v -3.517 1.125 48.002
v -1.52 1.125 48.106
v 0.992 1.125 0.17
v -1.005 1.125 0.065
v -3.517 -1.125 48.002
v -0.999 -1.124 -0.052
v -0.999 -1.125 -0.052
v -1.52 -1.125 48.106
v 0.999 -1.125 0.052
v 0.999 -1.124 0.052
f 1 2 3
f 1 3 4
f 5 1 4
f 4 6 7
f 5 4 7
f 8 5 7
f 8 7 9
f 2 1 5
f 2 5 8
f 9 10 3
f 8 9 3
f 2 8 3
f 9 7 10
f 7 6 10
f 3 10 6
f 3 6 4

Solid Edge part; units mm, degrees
sketch "Sketch1" plane through (0, 0, 0) normal (-0.0523, 0, 0.9986) x (0, 1, 0)
  line L0 (1.125, -1) -> (1.125, 1)
  line L1 (1.125, 1) -> (-1.125, 1)
  line L2 (-1.125, 1) -> (-1.125, -1)
  line L3 (-1.125, -1) -> (1.125, -1)
extrude "ExtrudedProtrusion_1" add sketch "Sketch1" along normal blind 48.12
sketch "Sketch2" plane through (-0.2574, 0, 24.0194) normal (0.9986, 0, 0.0523) x (0.0523, 0, -0.9986)
  line L0 (24, -1.125) -> (24, 1.125)
  line L1 (23.8821, 1.125) -> (24, 1.125)
  line L2 (24, -1.125) -> (23.8821, 1.125)
extrude "Cutout1" cut sketch "Sketch2" against normal up to vertex (2 mm away)
properties material "Stainless Steel, 420"
